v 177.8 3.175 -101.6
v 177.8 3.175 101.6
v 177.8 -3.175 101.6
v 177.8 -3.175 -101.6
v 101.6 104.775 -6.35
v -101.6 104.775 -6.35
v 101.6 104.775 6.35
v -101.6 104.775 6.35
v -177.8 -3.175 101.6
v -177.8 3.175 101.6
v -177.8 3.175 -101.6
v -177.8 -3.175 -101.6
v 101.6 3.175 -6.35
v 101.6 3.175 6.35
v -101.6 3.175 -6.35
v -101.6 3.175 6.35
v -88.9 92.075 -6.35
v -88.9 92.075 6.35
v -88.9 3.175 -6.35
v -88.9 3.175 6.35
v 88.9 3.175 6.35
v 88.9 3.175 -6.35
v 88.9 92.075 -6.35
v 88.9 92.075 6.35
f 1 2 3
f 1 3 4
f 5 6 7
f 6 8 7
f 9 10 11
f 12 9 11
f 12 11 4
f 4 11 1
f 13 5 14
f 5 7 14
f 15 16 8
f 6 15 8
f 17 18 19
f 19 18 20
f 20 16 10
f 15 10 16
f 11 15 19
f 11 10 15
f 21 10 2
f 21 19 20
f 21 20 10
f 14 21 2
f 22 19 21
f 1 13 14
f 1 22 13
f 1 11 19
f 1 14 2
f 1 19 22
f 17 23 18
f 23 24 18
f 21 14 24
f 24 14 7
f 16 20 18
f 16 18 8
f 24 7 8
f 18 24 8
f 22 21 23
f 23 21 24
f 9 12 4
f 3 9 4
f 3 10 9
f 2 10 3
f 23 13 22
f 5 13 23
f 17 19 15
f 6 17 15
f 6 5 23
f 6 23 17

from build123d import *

# Parameters (mm, degrees)
SKETCH1_W           = 355.6
SKETCH1_H           = 203.2
BOSS_EXTRUDE1_DEPTH = 3.175
BOSS_EXTRUDE2_DEPTH = 6.35


with BuildPart() as part:
    # Sketch1 → Boss-Extrude1 (new body, symmetric)
    with BuildSketch(Plane(origin=(0, 0, 0), x_dir=(1, 0, 0), z_dir=(0, 1, 0))):
        Rectangle(SKETCH1_W, SKETCH1_H)
    extrude(amount=BOSS_EXTRUDE1_DEPTH, both=True)

    # Sketch2 → Boss-Extrude2 (add, symmetric)
    with BuildSketch(Plane.XY):
        Polygon((-101.6, 3.175), (-101.6, 104.775), (101.6, 104.775), (101.6, 3.175), (88.9, 3.175), (88.9, 92.075), (-88.9, 92.075), (-88.9, 3.175), align=None)
    extrude(amount=BOSS_EXTRUDE2_DEPTH, both=True)


solid = part.part
